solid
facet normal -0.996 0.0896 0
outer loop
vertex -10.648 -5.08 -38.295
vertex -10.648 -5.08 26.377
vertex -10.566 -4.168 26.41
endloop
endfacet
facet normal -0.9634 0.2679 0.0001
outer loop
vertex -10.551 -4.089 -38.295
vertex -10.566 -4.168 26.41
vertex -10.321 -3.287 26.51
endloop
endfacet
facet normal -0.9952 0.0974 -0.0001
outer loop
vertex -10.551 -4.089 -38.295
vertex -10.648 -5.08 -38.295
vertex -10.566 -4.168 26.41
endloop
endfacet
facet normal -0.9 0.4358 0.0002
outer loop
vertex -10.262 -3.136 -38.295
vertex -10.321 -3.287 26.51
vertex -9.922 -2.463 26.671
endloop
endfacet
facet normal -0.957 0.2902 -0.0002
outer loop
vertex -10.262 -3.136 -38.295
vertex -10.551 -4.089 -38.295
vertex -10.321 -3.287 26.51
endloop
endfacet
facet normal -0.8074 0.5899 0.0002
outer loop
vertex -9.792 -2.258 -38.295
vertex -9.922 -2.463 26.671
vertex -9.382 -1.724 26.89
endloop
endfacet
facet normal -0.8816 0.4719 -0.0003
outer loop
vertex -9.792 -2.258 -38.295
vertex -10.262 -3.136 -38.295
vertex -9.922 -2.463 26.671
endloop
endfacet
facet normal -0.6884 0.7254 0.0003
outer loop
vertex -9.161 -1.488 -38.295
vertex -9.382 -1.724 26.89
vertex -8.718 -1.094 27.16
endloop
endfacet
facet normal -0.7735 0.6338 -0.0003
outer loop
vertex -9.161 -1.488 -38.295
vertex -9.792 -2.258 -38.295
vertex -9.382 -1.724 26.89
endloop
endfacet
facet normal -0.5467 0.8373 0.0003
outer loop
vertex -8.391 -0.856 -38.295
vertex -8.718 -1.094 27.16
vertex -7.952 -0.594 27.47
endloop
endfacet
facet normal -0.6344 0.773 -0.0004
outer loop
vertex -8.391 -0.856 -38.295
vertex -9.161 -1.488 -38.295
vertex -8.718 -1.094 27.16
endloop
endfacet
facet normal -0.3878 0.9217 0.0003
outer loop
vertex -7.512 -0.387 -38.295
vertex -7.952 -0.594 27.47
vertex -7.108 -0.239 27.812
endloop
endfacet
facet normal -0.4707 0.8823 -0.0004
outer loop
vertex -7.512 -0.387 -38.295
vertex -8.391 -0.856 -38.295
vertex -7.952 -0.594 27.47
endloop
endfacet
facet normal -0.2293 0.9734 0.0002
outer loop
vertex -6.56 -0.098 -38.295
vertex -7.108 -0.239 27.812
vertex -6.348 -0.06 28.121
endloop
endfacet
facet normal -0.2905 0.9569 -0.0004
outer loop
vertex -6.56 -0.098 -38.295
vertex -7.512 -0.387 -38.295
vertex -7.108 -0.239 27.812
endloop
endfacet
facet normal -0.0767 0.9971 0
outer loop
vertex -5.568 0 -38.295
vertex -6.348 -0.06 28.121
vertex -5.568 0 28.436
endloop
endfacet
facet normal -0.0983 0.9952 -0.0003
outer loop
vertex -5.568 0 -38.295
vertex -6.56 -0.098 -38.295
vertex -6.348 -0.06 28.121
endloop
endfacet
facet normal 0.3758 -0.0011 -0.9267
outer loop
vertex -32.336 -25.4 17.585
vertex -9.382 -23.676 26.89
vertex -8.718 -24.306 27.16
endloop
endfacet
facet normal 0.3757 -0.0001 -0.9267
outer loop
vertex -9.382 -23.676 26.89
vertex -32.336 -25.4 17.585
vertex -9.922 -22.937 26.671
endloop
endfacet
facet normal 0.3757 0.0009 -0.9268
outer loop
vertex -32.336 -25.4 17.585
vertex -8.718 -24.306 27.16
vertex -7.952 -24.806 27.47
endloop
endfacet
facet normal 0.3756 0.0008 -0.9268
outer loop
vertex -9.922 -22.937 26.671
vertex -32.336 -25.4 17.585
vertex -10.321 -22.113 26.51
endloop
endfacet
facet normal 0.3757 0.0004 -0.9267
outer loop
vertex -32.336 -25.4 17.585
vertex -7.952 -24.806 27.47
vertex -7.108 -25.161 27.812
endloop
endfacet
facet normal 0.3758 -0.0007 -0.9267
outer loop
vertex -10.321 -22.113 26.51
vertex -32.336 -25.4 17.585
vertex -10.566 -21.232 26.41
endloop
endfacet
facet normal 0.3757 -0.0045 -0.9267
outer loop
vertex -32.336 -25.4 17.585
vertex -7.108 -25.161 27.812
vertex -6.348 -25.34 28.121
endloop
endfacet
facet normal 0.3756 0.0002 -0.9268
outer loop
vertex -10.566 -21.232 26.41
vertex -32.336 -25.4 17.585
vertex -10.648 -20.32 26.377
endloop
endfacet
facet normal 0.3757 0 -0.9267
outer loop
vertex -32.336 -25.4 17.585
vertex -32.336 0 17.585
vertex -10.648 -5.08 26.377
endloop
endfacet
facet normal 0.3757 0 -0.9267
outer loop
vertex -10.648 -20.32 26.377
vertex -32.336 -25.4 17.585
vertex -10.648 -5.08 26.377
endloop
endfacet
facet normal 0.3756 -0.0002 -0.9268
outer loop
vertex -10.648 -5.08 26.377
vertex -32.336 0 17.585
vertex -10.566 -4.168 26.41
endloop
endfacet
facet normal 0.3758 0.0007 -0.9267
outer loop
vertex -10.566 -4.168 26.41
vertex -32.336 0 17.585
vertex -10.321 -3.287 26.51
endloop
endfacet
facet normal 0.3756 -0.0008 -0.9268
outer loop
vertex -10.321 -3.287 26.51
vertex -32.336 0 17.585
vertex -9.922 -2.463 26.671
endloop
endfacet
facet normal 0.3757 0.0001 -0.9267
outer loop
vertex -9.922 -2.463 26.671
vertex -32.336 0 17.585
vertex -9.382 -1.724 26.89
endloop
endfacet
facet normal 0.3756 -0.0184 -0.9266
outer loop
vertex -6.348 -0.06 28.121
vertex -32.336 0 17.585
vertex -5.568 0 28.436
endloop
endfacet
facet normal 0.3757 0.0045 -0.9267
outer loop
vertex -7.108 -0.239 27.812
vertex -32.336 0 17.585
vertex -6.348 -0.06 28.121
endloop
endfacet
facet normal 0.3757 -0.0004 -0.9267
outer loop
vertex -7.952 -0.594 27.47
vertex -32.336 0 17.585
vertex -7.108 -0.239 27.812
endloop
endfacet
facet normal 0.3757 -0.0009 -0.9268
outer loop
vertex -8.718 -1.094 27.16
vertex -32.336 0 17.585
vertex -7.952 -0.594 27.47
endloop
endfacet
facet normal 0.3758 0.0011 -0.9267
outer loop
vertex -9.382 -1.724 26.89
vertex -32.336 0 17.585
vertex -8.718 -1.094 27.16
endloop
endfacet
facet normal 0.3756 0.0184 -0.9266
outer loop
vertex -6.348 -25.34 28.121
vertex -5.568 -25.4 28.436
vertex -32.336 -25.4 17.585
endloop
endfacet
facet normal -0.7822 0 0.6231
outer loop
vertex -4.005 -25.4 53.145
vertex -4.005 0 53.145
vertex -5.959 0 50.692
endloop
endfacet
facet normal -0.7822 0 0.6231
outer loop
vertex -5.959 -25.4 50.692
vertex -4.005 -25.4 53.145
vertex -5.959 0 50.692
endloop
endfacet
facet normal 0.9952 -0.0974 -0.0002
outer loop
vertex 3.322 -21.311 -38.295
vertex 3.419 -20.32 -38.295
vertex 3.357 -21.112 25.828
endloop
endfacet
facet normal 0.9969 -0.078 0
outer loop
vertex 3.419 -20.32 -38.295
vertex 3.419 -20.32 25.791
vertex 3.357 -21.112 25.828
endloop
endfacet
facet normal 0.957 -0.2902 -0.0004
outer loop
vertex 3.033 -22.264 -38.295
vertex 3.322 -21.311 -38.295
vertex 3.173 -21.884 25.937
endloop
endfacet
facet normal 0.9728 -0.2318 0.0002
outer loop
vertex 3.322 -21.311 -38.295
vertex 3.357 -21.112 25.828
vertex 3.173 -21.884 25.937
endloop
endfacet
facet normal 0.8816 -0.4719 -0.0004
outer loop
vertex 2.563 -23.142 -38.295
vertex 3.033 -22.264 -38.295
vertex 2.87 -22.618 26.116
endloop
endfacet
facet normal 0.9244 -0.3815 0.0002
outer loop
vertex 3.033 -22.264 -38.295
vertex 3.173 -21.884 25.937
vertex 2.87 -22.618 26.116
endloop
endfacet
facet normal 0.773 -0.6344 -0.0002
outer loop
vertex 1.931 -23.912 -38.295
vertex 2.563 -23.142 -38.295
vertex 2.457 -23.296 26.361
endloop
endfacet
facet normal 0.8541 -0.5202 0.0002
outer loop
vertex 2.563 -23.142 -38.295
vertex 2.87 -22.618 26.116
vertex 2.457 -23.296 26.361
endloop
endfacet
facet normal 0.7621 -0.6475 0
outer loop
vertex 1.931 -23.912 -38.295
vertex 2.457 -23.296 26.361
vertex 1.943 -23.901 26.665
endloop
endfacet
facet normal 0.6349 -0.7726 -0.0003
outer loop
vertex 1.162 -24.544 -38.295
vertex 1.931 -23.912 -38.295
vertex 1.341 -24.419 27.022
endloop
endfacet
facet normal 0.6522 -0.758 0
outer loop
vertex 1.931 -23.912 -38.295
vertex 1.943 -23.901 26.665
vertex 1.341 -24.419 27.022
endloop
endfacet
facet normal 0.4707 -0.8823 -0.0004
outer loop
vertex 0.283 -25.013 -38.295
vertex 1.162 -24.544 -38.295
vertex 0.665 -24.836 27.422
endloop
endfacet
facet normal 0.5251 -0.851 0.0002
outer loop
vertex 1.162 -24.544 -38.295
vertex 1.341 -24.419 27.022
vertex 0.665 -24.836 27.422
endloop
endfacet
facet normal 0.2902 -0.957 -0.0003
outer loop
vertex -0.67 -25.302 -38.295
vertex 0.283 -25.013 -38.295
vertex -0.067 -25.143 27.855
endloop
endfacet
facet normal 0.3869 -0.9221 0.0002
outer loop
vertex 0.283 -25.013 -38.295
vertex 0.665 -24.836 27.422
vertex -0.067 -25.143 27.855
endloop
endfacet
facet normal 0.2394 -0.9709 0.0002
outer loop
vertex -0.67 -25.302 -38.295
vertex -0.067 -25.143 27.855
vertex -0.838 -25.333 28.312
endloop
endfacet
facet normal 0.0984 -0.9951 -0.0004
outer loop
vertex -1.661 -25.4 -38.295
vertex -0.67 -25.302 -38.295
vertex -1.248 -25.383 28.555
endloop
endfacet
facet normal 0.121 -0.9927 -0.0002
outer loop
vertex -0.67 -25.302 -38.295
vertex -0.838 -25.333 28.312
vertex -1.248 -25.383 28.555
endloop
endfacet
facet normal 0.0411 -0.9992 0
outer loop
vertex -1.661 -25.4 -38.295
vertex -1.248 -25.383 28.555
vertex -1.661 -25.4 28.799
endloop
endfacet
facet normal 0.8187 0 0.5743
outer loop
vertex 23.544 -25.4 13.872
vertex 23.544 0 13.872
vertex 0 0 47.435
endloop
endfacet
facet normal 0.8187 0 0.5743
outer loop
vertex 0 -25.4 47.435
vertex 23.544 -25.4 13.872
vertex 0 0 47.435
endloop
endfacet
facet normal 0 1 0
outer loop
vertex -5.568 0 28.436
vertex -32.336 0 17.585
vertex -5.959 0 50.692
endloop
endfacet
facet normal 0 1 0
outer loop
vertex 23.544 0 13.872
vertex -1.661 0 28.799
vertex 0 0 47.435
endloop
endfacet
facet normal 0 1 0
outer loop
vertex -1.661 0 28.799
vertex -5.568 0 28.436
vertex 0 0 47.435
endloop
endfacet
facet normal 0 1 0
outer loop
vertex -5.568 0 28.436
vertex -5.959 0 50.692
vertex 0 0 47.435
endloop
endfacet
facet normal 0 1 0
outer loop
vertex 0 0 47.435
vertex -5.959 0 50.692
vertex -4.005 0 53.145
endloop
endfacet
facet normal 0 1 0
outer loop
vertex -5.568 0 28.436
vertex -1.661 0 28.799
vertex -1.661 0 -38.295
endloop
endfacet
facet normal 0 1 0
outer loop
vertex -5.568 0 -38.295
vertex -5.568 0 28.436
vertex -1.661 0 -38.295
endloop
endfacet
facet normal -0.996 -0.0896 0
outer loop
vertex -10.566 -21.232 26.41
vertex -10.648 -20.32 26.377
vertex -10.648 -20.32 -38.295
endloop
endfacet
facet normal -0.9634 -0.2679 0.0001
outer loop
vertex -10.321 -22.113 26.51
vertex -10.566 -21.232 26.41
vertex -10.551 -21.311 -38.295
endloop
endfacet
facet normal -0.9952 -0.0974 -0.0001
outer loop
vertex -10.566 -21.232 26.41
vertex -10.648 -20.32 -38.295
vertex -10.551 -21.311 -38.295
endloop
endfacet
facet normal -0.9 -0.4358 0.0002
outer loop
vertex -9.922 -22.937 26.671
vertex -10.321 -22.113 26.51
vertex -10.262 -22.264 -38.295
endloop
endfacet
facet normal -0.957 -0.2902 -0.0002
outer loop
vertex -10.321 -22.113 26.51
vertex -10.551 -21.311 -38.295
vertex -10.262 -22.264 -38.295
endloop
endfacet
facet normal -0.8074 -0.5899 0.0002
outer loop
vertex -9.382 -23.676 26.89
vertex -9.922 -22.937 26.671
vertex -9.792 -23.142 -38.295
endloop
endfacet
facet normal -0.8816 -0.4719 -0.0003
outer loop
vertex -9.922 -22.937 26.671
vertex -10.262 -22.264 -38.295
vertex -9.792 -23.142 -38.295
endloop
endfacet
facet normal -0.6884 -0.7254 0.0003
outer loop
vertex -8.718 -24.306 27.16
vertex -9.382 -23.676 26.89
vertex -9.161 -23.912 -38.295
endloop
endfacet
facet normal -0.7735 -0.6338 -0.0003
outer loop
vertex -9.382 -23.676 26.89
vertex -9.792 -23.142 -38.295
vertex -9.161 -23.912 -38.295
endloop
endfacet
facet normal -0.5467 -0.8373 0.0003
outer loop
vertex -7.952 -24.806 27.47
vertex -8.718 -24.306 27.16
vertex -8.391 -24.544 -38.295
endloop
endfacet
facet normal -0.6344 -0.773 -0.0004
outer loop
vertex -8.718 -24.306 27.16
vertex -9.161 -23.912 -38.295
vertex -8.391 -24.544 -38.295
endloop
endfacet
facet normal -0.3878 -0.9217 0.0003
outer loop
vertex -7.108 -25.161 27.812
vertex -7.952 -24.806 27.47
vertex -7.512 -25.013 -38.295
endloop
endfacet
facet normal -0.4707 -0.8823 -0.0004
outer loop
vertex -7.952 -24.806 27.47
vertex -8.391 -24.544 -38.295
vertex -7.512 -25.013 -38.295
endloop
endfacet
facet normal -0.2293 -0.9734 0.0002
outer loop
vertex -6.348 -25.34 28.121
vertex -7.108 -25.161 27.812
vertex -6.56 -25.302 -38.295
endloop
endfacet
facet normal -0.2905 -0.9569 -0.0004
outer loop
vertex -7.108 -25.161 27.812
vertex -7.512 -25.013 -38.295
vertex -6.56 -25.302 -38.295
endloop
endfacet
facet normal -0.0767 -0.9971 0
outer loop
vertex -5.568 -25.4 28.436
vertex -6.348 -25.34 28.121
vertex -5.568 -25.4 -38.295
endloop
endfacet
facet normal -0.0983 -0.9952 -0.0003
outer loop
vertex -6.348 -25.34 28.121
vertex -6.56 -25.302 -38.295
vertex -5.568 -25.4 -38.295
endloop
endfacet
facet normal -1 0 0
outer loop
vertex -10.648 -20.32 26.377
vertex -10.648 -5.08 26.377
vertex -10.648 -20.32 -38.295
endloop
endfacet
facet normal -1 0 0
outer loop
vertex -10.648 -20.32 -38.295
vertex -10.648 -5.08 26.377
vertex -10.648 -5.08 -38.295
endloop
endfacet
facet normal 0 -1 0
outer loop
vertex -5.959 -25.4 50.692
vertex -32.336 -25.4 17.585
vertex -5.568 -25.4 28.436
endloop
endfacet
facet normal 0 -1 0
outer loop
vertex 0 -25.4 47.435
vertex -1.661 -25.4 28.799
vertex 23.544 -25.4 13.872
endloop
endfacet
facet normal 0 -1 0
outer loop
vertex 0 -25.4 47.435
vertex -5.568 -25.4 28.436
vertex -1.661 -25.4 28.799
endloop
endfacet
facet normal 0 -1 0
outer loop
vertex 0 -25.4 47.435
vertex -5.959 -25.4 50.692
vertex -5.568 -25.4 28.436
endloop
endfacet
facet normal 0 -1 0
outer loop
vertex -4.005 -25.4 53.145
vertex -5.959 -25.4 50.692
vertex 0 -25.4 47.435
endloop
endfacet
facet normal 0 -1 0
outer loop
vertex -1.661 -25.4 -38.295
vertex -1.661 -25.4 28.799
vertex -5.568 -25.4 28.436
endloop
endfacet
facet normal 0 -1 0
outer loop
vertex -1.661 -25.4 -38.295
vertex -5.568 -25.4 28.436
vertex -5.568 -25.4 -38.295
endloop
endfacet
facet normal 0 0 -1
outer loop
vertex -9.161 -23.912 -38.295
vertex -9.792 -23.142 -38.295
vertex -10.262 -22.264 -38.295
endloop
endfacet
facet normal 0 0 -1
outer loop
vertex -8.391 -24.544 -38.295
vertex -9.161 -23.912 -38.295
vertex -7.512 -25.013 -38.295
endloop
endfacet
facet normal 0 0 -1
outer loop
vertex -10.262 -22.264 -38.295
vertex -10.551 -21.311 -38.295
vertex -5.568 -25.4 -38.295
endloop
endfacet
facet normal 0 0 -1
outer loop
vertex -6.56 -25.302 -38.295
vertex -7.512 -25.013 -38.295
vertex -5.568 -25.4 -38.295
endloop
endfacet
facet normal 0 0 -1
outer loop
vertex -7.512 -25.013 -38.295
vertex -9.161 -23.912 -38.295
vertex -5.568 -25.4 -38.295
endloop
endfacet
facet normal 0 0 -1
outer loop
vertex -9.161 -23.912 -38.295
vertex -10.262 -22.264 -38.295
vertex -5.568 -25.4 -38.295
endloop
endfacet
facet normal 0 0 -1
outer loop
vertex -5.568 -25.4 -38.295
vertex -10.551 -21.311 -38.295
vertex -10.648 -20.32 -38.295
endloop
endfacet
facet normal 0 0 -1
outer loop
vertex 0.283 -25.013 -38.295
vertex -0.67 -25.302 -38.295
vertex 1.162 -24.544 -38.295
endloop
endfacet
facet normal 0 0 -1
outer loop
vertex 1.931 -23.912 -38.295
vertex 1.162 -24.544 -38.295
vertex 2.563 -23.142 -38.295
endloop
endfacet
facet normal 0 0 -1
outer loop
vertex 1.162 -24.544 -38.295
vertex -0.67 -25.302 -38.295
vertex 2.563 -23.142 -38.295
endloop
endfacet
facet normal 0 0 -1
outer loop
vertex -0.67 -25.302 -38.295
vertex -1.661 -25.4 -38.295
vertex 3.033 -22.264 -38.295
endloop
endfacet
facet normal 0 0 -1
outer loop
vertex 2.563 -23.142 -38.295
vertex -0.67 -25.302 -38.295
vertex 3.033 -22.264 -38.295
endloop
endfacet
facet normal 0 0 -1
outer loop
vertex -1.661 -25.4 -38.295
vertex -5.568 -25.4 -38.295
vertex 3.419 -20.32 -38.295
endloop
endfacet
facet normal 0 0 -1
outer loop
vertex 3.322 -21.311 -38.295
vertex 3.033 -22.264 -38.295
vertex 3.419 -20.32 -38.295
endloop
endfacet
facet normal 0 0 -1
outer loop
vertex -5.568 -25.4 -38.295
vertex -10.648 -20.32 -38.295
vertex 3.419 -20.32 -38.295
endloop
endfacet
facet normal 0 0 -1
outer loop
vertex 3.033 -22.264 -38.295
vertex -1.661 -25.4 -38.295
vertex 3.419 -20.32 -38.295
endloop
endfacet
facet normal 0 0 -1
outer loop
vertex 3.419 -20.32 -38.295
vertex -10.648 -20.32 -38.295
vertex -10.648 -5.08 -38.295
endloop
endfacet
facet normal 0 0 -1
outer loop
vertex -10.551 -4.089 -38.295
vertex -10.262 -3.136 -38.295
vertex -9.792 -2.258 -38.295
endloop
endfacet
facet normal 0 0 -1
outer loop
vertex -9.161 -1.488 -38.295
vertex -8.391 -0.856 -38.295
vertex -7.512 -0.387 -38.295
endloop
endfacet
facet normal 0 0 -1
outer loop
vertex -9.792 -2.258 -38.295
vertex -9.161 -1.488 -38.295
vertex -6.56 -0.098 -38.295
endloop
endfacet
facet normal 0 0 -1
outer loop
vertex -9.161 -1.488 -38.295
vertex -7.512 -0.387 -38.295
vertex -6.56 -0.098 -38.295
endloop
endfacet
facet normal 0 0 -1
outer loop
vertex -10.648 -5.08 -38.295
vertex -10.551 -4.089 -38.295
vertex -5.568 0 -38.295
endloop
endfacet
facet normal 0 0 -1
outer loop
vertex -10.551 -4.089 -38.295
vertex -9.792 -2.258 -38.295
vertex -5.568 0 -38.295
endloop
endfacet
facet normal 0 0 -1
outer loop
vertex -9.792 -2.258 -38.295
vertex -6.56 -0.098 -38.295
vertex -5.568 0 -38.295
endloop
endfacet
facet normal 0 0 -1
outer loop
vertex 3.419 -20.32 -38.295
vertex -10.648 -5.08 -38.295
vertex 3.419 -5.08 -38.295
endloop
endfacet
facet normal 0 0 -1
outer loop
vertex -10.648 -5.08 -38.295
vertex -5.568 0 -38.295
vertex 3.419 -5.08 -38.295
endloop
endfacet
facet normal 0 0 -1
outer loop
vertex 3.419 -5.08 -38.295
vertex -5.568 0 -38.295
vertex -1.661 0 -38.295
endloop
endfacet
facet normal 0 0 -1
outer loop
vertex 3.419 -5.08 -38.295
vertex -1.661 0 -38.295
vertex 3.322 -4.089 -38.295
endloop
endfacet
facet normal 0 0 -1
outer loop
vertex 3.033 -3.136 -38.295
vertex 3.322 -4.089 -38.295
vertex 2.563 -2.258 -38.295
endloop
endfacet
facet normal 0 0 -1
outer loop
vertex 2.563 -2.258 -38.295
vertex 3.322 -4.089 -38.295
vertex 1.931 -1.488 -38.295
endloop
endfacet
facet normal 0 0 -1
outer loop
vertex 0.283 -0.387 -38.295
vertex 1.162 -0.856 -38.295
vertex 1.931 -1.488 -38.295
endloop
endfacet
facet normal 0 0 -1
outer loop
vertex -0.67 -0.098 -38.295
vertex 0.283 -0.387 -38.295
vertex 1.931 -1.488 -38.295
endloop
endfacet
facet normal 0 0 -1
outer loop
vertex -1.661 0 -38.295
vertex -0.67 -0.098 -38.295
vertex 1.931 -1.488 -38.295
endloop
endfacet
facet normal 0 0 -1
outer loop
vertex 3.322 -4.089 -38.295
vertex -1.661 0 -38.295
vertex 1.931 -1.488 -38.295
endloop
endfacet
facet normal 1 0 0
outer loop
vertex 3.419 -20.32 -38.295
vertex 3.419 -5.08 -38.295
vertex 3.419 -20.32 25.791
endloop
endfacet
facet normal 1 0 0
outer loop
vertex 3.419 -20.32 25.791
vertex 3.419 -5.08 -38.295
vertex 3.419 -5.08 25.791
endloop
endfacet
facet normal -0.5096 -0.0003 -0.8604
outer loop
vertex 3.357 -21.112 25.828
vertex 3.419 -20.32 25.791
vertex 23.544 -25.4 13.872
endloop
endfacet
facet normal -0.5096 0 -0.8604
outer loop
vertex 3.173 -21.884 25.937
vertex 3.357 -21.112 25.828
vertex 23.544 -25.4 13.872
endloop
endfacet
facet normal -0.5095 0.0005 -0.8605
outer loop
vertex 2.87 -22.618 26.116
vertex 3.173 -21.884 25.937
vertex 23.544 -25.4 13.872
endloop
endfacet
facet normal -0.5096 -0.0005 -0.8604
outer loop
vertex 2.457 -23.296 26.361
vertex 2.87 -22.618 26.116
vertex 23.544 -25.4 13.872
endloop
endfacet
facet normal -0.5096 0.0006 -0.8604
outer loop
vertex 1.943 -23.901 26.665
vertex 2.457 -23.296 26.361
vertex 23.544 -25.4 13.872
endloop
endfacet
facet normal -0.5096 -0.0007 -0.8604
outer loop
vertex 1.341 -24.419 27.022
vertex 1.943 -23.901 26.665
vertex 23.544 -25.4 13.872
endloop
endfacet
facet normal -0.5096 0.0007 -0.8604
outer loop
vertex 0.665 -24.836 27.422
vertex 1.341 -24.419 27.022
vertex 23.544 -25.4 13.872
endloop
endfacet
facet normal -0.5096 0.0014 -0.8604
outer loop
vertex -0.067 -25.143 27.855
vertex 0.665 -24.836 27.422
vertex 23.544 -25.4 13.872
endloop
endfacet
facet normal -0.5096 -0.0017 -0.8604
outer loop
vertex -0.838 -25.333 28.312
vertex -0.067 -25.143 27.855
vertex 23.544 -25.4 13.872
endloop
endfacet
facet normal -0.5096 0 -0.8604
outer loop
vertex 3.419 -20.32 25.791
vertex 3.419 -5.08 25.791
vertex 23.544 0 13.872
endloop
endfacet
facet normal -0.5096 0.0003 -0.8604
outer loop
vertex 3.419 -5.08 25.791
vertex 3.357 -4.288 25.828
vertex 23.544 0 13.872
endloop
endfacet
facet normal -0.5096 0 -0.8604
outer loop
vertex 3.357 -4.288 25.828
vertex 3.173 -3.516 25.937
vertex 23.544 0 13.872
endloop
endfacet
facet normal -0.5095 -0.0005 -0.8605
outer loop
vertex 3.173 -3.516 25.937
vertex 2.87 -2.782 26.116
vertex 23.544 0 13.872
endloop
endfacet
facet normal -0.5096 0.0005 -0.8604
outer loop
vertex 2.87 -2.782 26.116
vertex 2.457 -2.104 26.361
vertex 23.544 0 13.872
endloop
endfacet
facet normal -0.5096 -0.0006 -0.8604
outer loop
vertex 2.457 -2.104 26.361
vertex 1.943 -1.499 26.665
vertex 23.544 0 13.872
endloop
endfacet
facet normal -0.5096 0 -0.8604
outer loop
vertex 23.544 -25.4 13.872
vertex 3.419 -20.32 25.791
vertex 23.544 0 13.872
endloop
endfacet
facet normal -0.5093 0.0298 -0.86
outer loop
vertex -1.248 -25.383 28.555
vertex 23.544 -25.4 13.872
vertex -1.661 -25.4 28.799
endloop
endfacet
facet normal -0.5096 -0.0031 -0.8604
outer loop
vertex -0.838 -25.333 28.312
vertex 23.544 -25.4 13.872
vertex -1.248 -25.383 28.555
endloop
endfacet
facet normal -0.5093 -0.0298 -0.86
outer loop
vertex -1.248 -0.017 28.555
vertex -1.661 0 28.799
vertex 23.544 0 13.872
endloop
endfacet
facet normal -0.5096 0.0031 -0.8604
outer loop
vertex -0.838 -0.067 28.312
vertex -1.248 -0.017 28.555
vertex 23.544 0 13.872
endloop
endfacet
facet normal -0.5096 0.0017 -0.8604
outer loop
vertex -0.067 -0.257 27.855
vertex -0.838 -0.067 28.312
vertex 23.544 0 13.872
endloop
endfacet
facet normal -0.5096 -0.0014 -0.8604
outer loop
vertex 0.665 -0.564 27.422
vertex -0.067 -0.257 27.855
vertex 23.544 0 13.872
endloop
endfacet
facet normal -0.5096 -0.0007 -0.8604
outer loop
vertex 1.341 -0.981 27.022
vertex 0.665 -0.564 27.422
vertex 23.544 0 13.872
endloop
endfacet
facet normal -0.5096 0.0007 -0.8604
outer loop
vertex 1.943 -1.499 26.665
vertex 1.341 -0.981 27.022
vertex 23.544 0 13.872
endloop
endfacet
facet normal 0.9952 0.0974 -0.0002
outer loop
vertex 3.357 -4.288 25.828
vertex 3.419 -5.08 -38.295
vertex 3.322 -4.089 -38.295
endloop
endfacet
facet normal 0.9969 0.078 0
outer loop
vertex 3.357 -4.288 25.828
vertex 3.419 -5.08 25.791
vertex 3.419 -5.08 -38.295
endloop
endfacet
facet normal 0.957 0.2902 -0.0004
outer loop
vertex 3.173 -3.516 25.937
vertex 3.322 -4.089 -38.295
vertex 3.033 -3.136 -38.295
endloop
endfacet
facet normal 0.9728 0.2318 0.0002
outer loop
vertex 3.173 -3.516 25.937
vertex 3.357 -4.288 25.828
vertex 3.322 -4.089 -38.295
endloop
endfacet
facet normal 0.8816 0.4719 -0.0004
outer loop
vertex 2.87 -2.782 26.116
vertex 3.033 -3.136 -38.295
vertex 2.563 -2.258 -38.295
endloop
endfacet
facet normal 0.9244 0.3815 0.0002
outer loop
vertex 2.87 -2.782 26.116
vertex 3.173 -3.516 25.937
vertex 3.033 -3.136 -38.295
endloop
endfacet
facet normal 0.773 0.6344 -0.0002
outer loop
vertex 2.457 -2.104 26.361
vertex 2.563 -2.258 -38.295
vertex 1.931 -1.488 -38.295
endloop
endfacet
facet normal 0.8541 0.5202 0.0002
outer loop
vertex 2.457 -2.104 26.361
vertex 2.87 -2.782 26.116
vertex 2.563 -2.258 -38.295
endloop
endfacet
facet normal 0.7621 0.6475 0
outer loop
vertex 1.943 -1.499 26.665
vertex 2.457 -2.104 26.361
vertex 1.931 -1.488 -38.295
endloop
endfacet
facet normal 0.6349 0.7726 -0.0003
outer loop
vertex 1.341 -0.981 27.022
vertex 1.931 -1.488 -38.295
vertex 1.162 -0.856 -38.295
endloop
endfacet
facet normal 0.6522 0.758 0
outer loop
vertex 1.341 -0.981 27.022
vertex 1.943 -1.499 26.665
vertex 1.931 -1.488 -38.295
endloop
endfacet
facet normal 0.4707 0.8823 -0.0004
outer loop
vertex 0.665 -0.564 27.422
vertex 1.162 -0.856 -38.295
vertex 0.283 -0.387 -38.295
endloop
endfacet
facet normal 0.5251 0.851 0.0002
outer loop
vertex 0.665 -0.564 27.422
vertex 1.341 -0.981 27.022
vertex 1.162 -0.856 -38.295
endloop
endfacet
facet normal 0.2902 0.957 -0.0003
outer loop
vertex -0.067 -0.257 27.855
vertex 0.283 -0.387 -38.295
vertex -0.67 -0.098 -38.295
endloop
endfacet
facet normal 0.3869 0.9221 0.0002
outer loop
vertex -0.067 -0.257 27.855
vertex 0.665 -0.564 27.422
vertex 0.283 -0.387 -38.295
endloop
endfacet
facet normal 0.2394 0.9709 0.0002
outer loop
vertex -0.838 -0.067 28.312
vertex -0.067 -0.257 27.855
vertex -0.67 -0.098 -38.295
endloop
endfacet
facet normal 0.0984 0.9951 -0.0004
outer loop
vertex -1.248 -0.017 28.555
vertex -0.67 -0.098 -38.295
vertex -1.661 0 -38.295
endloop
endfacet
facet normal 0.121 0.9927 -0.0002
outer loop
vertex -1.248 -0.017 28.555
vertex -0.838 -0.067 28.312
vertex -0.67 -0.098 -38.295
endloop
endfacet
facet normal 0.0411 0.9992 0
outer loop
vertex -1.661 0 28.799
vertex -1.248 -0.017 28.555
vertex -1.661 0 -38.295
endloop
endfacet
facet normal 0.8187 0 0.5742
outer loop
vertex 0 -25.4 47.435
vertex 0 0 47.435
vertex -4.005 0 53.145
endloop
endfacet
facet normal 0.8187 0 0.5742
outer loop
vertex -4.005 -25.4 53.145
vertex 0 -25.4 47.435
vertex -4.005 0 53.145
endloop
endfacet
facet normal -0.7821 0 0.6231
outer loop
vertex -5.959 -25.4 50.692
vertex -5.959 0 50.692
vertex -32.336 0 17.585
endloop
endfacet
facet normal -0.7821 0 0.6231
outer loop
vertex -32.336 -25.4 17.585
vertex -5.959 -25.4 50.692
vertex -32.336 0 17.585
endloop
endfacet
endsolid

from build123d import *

# Parameters (mm, degrees)
F1_DEPTH = 25.4
F2_R     = 5.08


with BuildPart() as f1:
    # F0 (on Front) → F1 (new body)
    with BuildSketch(Plane.XZ):
        Polygon((-32.336153, 17.584616), (-10.648462, 26.376924), (-10.648462, -38.295384), (-5.959231, -38.295384), (-5.959231, 50.692204), align=None)
        Polygon((-5.959231, 50.692204), (-5.959231, -38.295384), (0, -38.295384), (0, 47.434815), (-4.005384, 53.144619), align=None)
        Polygon((0, 47.434815), (0, -38.295384), (3.419231, -38.295384), (3.419231, 25.79077), (23.543846, 13.872309), align=None)
    extrude(amount=F1_DEPTH)

    # F2
    f2_edges = [f1.edges().sort_by_distance(p)[0] for p in [
        (3.419231, -25.4, -6.252307),
        (-10.648462, -25.4, -5.95923),
        (3.419231, 0, -6.252307),
        (-10.648462, 0, -5.95923),
    ]]
    fillet(f2_edges, radius=F2_R)


solid = f1.part
